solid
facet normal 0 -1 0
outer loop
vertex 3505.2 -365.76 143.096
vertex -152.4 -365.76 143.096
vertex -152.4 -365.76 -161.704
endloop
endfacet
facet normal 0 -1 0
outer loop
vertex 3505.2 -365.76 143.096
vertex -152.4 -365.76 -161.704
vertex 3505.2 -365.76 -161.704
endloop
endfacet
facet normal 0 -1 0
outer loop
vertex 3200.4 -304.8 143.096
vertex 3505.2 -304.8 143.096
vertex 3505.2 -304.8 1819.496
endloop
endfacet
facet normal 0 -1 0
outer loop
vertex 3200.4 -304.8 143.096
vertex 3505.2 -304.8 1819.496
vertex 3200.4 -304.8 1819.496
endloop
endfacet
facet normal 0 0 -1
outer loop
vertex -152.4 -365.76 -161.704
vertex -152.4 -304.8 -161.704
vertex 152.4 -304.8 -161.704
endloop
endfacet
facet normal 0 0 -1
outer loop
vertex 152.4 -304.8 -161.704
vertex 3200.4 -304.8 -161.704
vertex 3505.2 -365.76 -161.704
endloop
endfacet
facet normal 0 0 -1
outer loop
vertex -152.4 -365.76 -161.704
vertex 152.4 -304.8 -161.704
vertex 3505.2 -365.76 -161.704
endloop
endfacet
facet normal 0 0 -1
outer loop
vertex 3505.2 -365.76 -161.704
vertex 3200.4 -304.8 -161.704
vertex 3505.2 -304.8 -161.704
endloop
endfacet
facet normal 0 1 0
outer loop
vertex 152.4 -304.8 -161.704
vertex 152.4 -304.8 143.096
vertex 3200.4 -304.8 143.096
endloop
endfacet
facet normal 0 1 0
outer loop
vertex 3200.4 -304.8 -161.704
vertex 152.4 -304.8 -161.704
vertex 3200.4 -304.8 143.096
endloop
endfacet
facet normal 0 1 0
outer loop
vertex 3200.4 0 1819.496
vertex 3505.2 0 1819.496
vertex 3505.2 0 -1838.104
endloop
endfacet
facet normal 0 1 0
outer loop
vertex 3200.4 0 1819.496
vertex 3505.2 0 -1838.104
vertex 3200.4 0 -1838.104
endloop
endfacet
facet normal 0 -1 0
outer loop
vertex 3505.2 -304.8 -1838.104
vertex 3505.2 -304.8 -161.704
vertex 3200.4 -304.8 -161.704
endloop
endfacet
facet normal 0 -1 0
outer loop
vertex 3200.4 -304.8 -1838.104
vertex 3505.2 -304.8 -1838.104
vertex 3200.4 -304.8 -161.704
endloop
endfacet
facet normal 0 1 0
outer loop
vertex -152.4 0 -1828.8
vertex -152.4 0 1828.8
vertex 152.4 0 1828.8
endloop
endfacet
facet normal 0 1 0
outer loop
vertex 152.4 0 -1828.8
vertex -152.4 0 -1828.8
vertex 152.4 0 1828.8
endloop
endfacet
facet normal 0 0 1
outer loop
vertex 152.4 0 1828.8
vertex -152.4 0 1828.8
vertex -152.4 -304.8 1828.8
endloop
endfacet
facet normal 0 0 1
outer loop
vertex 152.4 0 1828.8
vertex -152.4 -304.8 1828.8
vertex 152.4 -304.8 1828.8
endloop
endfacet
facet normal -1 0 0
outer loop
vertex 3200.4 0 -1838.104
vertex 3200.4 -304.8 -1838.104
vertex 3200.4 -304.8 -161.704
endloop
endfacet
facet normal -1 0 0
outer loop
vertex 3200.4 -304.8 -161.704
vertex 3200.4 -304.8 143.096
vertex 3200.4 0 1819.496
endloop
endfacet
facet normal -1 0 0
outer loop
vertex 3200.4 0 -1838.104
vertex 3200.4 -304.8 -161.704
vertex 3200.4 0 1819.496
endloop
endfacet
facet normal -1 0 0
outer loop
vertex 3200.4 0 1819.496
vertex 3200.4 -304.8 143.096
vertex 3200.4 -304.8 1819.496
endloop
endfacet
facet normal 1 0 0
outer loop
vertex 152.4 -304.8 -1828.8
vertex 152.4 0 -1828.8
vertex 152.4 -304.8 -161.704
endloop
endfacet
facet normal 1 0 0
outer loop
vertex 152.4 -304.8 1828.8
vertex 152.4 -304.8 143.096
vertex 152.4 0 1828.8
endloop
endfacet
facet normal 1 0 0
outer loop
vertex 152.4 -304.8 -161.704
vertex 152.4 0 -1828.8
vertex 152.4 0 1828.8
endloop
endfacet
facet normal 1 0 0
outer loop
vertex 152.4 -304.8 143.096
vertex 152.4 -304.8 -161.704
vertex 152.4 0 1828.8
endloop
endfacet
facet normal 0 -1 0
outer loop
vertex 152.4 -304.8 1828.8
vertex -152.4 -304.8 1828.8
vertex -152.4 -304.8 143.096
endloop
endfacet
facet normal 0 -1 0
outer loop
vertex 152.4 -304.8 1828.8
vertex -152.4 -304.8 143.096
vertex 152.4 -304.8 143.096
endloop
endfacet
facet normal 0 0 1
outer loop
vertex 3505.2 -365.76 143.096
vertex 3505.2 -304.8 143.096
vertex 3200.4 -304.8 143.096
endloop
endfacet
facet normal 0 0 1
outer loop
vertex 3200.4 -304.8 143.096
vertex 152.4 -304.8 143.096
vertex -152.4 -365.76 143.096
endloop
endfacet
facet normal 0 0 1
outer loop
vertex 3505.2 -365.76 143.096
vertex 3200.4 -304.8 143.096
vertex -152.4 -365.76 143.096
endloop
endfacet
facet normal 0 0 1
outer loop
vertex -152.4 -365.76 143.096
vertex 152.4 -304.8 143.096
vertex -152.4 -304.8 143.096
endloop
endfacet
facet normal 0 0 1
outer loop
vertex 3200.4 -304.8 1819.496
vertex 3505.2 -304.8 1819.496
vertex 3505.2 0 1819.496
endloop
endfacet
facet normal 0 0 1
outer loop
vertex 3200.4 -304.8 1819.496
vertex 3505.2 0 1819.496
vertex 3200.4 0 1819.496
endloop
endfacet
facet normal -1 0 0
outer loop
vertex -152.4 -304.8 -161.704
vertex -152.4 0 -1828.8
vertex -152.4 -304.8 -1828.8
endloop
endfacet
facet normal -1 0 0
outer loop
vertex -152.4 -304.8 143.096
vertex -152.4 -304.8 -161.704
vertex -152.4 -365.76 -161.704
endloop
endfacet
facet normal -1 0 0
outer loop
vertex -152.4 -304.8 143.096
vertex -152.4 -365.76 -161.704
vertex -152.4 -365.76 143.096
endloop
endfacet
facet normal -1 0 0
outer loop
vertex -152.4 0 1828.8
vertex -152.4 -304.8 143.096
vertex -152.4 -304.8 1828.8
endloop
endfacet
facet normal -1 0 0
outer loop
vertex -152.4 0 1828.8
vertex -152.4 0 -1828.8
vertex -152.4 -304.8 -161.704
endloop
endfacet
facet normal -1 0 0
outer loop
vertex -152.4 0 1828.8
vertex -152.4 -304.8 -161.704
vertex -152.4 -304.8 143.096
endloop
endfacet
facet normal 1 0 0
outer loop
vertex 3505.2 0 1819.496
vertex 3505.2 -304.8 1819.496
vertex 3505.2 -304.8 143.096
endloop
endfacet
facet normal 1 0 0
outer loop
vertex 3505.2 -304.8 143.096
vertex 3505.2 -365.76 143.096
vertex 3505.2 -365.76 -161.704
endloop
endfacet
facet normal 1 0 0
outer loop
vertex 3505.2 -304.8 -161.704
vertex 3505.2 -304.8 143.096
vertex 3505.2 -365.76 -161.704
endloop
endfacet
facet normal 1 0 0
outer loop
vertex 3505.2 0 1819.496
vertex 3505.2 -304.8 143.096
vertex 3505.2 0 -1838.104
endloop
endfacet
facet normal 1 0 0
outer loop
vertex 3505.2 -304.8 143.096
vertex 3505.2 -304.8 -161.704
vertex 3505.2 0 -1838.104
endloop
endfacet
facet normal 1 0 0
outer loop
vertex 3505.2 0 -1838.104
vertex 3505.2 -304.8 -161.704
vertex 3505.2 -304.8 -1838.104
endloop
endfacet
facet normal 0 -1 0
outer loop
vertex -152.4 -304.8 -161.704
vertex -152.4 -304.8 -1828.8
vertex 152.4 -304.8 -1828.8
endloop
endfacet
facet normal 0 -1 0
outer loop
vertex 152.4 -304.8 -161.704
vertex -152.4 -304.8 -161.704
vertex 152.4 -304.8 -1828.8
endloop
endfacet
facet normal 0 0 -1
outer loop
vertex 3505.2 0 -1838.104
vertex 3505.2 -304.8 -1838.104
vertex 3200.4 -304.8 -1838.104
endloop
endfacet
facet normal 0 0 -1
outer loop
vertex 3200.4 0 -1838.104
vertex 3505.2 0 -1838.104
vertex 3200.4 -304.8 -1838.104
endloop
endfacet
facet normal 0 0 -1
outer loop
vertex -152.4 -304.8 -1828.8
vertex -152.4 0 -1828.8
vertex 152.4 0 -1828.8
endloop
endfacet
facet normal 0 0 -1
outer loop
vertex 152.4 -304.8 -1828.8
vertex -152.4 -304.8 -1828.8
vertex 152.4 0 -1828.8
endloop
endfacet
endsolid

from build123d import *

# Parameters (mm, degrees)
F0_W     = 304.8
F0_H     = 3657.6
F1_DEPTH = 304.8
F2_W     = 304.8
F2_H     = 304.8
F2_W_2   = 3352.8
F3_DEPTH = 60.96
F4_W     = 304.8
F4_H     = 1676.4
F4_H_2   = 304.8
F5_DEPTH = 304.8


with BuildPart() as f1:
    # F0 (on Front) → F1 (new body)
    with BuildSketch(Plane.XZ):
        Rectangle(F0_W, F0_H)
    extrude(amount=F1_DEPTH)

    # F2 (on face) → F3 (join)
    with BuildSketch(Plane.XZ.offset(304.8)):
        with Locations((0, -9.3044210434)):
            Rectangle(F2_W, F2_H)
        with Locations((1828.8, -9.3044210434)):
            Rectangle(F2_W_2, F2_H)
    extrude(amount=F3_DEPTH)

    # F4 (on face) → F5 (join)
    with BuildSketch(Plane(origin=(0, -304.8, 0), x_dir=(-1, 0, 0), z_dir=(0, 1, 0))):
        with Locations((-3352.8, 981.2955789566)):
            Rectangle(F4_W, F4_H)
        with Locations((-3352.8, -9.3044210434)):
            Rectangle(F4_W, F4_H_2)
        with Locations((-3352.8, -999.9044210434)):
            Rectangle(F4_W, F4_H)
    extrude(amount=F5_DEPTH)


solid = f1.part
